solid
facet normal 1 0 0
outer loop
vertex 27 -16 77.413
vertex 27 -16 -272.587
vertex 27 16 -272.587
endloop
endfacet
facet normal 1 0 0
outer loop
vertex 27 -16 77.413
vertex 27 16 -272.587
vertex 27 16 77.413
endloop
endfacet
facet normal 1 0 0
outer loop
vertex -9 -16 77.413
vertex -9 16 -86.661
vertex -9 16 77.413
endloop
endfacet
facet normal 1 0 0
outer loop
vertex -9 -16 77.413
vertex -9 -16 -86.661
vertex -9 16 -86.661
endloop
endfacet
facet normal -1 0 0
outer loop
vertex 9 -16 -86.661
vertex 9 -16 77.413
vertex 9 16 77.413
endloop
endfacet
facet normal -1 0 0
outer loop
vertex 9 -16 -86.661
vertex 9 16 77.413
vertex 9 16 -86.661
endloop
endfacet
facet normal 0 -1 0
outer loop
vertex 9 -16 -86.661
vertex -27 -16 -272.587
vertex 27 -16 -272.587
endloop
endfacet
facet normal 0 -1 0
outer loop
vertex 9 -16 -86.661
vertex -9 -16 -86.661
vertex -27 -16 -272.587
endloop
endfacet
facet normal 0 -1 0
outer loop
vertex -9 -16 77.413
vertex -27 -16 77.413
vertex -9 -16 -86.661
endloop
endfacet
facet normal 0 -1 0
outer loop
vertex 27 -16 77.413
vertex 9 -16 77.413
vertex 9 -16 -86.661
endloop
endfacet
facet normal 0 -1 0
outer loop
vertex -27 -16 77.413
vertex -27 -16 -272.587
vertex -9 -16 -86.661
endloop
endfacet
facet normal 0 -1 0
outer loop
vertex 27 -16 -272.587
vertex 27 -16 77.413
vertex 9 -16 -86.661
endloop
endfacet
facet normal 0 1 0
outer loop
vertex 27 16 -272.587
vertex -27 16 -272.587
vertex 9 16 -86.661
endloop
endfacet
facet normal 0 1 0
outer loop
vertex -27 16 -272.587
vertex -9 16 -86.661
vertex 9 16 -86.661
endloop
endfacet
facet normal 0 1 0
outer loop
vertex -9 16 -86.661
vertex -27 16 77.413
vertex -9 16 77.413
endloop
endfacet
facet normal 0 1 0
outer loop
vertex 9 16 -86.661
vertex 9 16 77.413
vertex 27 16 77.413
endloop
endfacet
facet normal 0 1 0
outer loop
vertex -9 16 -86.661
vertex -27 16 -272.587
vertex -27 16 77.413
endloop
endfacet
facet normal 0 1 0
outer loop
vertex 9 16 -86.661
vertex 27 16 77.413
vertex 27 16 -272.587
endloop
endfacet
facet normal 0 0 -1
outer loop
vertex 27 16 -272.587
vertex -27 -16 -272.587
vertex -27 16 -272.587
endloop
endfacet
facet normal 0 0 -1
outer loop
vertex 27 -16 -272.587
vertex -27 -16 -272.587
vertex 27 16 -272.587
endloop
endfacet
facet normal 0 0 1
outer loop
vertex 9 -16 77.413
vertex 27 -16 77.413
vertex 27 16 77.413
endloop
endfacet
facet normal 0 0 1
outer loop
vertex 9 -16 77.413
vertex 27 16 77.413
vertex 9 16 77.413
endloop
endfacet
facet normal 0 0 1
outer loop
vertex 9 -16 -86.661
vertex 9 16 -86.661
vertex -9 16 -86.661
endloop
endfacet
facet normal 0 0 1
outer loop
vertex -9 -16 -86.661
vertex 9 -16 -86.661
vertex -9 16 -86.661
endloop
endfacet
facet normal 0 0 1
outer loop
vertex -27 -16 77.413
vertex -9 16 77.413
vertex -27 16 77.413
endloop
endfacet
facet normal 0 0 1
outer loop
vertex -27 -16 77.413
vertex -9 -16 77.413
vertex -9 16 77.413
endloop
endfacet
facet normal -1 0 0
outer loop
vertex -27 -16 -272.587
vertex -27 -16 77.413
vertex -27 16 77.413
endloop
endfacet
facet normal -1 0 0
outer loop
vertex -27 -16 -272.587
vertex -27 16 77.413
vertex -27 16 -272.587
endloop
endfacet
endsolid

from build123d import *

# Parameters (mm, degrees)
F1_DEPTH      = 16
F1_DEPTH_BACK = 16


# Not quite as in the source:
# - a feature names something its author has since deleted; it is built from what else it names


with BuildPart() as f1:
    # F0 (on Front) → F1 (new body, two sides)
    with BuildSketch(Plane.XZ) as f1_sk:
        Polygon((-9, 77.4134680122), (-27, 77.4134680122), (-27, -272.5865319878), (-9, -272.5865319878), (9, -272.5865319878), (27, -272.5865319878), (27, 77.4134680122), (9, 77.4134680122), (9, -86.6605598913), (-9, -86.6605598913), align=None)
    extrude(amount=F1_DEPTH)
    extrude(f1_sk.sketch, amount=-F1_DEPTH_BACK)


solid = f1.part
